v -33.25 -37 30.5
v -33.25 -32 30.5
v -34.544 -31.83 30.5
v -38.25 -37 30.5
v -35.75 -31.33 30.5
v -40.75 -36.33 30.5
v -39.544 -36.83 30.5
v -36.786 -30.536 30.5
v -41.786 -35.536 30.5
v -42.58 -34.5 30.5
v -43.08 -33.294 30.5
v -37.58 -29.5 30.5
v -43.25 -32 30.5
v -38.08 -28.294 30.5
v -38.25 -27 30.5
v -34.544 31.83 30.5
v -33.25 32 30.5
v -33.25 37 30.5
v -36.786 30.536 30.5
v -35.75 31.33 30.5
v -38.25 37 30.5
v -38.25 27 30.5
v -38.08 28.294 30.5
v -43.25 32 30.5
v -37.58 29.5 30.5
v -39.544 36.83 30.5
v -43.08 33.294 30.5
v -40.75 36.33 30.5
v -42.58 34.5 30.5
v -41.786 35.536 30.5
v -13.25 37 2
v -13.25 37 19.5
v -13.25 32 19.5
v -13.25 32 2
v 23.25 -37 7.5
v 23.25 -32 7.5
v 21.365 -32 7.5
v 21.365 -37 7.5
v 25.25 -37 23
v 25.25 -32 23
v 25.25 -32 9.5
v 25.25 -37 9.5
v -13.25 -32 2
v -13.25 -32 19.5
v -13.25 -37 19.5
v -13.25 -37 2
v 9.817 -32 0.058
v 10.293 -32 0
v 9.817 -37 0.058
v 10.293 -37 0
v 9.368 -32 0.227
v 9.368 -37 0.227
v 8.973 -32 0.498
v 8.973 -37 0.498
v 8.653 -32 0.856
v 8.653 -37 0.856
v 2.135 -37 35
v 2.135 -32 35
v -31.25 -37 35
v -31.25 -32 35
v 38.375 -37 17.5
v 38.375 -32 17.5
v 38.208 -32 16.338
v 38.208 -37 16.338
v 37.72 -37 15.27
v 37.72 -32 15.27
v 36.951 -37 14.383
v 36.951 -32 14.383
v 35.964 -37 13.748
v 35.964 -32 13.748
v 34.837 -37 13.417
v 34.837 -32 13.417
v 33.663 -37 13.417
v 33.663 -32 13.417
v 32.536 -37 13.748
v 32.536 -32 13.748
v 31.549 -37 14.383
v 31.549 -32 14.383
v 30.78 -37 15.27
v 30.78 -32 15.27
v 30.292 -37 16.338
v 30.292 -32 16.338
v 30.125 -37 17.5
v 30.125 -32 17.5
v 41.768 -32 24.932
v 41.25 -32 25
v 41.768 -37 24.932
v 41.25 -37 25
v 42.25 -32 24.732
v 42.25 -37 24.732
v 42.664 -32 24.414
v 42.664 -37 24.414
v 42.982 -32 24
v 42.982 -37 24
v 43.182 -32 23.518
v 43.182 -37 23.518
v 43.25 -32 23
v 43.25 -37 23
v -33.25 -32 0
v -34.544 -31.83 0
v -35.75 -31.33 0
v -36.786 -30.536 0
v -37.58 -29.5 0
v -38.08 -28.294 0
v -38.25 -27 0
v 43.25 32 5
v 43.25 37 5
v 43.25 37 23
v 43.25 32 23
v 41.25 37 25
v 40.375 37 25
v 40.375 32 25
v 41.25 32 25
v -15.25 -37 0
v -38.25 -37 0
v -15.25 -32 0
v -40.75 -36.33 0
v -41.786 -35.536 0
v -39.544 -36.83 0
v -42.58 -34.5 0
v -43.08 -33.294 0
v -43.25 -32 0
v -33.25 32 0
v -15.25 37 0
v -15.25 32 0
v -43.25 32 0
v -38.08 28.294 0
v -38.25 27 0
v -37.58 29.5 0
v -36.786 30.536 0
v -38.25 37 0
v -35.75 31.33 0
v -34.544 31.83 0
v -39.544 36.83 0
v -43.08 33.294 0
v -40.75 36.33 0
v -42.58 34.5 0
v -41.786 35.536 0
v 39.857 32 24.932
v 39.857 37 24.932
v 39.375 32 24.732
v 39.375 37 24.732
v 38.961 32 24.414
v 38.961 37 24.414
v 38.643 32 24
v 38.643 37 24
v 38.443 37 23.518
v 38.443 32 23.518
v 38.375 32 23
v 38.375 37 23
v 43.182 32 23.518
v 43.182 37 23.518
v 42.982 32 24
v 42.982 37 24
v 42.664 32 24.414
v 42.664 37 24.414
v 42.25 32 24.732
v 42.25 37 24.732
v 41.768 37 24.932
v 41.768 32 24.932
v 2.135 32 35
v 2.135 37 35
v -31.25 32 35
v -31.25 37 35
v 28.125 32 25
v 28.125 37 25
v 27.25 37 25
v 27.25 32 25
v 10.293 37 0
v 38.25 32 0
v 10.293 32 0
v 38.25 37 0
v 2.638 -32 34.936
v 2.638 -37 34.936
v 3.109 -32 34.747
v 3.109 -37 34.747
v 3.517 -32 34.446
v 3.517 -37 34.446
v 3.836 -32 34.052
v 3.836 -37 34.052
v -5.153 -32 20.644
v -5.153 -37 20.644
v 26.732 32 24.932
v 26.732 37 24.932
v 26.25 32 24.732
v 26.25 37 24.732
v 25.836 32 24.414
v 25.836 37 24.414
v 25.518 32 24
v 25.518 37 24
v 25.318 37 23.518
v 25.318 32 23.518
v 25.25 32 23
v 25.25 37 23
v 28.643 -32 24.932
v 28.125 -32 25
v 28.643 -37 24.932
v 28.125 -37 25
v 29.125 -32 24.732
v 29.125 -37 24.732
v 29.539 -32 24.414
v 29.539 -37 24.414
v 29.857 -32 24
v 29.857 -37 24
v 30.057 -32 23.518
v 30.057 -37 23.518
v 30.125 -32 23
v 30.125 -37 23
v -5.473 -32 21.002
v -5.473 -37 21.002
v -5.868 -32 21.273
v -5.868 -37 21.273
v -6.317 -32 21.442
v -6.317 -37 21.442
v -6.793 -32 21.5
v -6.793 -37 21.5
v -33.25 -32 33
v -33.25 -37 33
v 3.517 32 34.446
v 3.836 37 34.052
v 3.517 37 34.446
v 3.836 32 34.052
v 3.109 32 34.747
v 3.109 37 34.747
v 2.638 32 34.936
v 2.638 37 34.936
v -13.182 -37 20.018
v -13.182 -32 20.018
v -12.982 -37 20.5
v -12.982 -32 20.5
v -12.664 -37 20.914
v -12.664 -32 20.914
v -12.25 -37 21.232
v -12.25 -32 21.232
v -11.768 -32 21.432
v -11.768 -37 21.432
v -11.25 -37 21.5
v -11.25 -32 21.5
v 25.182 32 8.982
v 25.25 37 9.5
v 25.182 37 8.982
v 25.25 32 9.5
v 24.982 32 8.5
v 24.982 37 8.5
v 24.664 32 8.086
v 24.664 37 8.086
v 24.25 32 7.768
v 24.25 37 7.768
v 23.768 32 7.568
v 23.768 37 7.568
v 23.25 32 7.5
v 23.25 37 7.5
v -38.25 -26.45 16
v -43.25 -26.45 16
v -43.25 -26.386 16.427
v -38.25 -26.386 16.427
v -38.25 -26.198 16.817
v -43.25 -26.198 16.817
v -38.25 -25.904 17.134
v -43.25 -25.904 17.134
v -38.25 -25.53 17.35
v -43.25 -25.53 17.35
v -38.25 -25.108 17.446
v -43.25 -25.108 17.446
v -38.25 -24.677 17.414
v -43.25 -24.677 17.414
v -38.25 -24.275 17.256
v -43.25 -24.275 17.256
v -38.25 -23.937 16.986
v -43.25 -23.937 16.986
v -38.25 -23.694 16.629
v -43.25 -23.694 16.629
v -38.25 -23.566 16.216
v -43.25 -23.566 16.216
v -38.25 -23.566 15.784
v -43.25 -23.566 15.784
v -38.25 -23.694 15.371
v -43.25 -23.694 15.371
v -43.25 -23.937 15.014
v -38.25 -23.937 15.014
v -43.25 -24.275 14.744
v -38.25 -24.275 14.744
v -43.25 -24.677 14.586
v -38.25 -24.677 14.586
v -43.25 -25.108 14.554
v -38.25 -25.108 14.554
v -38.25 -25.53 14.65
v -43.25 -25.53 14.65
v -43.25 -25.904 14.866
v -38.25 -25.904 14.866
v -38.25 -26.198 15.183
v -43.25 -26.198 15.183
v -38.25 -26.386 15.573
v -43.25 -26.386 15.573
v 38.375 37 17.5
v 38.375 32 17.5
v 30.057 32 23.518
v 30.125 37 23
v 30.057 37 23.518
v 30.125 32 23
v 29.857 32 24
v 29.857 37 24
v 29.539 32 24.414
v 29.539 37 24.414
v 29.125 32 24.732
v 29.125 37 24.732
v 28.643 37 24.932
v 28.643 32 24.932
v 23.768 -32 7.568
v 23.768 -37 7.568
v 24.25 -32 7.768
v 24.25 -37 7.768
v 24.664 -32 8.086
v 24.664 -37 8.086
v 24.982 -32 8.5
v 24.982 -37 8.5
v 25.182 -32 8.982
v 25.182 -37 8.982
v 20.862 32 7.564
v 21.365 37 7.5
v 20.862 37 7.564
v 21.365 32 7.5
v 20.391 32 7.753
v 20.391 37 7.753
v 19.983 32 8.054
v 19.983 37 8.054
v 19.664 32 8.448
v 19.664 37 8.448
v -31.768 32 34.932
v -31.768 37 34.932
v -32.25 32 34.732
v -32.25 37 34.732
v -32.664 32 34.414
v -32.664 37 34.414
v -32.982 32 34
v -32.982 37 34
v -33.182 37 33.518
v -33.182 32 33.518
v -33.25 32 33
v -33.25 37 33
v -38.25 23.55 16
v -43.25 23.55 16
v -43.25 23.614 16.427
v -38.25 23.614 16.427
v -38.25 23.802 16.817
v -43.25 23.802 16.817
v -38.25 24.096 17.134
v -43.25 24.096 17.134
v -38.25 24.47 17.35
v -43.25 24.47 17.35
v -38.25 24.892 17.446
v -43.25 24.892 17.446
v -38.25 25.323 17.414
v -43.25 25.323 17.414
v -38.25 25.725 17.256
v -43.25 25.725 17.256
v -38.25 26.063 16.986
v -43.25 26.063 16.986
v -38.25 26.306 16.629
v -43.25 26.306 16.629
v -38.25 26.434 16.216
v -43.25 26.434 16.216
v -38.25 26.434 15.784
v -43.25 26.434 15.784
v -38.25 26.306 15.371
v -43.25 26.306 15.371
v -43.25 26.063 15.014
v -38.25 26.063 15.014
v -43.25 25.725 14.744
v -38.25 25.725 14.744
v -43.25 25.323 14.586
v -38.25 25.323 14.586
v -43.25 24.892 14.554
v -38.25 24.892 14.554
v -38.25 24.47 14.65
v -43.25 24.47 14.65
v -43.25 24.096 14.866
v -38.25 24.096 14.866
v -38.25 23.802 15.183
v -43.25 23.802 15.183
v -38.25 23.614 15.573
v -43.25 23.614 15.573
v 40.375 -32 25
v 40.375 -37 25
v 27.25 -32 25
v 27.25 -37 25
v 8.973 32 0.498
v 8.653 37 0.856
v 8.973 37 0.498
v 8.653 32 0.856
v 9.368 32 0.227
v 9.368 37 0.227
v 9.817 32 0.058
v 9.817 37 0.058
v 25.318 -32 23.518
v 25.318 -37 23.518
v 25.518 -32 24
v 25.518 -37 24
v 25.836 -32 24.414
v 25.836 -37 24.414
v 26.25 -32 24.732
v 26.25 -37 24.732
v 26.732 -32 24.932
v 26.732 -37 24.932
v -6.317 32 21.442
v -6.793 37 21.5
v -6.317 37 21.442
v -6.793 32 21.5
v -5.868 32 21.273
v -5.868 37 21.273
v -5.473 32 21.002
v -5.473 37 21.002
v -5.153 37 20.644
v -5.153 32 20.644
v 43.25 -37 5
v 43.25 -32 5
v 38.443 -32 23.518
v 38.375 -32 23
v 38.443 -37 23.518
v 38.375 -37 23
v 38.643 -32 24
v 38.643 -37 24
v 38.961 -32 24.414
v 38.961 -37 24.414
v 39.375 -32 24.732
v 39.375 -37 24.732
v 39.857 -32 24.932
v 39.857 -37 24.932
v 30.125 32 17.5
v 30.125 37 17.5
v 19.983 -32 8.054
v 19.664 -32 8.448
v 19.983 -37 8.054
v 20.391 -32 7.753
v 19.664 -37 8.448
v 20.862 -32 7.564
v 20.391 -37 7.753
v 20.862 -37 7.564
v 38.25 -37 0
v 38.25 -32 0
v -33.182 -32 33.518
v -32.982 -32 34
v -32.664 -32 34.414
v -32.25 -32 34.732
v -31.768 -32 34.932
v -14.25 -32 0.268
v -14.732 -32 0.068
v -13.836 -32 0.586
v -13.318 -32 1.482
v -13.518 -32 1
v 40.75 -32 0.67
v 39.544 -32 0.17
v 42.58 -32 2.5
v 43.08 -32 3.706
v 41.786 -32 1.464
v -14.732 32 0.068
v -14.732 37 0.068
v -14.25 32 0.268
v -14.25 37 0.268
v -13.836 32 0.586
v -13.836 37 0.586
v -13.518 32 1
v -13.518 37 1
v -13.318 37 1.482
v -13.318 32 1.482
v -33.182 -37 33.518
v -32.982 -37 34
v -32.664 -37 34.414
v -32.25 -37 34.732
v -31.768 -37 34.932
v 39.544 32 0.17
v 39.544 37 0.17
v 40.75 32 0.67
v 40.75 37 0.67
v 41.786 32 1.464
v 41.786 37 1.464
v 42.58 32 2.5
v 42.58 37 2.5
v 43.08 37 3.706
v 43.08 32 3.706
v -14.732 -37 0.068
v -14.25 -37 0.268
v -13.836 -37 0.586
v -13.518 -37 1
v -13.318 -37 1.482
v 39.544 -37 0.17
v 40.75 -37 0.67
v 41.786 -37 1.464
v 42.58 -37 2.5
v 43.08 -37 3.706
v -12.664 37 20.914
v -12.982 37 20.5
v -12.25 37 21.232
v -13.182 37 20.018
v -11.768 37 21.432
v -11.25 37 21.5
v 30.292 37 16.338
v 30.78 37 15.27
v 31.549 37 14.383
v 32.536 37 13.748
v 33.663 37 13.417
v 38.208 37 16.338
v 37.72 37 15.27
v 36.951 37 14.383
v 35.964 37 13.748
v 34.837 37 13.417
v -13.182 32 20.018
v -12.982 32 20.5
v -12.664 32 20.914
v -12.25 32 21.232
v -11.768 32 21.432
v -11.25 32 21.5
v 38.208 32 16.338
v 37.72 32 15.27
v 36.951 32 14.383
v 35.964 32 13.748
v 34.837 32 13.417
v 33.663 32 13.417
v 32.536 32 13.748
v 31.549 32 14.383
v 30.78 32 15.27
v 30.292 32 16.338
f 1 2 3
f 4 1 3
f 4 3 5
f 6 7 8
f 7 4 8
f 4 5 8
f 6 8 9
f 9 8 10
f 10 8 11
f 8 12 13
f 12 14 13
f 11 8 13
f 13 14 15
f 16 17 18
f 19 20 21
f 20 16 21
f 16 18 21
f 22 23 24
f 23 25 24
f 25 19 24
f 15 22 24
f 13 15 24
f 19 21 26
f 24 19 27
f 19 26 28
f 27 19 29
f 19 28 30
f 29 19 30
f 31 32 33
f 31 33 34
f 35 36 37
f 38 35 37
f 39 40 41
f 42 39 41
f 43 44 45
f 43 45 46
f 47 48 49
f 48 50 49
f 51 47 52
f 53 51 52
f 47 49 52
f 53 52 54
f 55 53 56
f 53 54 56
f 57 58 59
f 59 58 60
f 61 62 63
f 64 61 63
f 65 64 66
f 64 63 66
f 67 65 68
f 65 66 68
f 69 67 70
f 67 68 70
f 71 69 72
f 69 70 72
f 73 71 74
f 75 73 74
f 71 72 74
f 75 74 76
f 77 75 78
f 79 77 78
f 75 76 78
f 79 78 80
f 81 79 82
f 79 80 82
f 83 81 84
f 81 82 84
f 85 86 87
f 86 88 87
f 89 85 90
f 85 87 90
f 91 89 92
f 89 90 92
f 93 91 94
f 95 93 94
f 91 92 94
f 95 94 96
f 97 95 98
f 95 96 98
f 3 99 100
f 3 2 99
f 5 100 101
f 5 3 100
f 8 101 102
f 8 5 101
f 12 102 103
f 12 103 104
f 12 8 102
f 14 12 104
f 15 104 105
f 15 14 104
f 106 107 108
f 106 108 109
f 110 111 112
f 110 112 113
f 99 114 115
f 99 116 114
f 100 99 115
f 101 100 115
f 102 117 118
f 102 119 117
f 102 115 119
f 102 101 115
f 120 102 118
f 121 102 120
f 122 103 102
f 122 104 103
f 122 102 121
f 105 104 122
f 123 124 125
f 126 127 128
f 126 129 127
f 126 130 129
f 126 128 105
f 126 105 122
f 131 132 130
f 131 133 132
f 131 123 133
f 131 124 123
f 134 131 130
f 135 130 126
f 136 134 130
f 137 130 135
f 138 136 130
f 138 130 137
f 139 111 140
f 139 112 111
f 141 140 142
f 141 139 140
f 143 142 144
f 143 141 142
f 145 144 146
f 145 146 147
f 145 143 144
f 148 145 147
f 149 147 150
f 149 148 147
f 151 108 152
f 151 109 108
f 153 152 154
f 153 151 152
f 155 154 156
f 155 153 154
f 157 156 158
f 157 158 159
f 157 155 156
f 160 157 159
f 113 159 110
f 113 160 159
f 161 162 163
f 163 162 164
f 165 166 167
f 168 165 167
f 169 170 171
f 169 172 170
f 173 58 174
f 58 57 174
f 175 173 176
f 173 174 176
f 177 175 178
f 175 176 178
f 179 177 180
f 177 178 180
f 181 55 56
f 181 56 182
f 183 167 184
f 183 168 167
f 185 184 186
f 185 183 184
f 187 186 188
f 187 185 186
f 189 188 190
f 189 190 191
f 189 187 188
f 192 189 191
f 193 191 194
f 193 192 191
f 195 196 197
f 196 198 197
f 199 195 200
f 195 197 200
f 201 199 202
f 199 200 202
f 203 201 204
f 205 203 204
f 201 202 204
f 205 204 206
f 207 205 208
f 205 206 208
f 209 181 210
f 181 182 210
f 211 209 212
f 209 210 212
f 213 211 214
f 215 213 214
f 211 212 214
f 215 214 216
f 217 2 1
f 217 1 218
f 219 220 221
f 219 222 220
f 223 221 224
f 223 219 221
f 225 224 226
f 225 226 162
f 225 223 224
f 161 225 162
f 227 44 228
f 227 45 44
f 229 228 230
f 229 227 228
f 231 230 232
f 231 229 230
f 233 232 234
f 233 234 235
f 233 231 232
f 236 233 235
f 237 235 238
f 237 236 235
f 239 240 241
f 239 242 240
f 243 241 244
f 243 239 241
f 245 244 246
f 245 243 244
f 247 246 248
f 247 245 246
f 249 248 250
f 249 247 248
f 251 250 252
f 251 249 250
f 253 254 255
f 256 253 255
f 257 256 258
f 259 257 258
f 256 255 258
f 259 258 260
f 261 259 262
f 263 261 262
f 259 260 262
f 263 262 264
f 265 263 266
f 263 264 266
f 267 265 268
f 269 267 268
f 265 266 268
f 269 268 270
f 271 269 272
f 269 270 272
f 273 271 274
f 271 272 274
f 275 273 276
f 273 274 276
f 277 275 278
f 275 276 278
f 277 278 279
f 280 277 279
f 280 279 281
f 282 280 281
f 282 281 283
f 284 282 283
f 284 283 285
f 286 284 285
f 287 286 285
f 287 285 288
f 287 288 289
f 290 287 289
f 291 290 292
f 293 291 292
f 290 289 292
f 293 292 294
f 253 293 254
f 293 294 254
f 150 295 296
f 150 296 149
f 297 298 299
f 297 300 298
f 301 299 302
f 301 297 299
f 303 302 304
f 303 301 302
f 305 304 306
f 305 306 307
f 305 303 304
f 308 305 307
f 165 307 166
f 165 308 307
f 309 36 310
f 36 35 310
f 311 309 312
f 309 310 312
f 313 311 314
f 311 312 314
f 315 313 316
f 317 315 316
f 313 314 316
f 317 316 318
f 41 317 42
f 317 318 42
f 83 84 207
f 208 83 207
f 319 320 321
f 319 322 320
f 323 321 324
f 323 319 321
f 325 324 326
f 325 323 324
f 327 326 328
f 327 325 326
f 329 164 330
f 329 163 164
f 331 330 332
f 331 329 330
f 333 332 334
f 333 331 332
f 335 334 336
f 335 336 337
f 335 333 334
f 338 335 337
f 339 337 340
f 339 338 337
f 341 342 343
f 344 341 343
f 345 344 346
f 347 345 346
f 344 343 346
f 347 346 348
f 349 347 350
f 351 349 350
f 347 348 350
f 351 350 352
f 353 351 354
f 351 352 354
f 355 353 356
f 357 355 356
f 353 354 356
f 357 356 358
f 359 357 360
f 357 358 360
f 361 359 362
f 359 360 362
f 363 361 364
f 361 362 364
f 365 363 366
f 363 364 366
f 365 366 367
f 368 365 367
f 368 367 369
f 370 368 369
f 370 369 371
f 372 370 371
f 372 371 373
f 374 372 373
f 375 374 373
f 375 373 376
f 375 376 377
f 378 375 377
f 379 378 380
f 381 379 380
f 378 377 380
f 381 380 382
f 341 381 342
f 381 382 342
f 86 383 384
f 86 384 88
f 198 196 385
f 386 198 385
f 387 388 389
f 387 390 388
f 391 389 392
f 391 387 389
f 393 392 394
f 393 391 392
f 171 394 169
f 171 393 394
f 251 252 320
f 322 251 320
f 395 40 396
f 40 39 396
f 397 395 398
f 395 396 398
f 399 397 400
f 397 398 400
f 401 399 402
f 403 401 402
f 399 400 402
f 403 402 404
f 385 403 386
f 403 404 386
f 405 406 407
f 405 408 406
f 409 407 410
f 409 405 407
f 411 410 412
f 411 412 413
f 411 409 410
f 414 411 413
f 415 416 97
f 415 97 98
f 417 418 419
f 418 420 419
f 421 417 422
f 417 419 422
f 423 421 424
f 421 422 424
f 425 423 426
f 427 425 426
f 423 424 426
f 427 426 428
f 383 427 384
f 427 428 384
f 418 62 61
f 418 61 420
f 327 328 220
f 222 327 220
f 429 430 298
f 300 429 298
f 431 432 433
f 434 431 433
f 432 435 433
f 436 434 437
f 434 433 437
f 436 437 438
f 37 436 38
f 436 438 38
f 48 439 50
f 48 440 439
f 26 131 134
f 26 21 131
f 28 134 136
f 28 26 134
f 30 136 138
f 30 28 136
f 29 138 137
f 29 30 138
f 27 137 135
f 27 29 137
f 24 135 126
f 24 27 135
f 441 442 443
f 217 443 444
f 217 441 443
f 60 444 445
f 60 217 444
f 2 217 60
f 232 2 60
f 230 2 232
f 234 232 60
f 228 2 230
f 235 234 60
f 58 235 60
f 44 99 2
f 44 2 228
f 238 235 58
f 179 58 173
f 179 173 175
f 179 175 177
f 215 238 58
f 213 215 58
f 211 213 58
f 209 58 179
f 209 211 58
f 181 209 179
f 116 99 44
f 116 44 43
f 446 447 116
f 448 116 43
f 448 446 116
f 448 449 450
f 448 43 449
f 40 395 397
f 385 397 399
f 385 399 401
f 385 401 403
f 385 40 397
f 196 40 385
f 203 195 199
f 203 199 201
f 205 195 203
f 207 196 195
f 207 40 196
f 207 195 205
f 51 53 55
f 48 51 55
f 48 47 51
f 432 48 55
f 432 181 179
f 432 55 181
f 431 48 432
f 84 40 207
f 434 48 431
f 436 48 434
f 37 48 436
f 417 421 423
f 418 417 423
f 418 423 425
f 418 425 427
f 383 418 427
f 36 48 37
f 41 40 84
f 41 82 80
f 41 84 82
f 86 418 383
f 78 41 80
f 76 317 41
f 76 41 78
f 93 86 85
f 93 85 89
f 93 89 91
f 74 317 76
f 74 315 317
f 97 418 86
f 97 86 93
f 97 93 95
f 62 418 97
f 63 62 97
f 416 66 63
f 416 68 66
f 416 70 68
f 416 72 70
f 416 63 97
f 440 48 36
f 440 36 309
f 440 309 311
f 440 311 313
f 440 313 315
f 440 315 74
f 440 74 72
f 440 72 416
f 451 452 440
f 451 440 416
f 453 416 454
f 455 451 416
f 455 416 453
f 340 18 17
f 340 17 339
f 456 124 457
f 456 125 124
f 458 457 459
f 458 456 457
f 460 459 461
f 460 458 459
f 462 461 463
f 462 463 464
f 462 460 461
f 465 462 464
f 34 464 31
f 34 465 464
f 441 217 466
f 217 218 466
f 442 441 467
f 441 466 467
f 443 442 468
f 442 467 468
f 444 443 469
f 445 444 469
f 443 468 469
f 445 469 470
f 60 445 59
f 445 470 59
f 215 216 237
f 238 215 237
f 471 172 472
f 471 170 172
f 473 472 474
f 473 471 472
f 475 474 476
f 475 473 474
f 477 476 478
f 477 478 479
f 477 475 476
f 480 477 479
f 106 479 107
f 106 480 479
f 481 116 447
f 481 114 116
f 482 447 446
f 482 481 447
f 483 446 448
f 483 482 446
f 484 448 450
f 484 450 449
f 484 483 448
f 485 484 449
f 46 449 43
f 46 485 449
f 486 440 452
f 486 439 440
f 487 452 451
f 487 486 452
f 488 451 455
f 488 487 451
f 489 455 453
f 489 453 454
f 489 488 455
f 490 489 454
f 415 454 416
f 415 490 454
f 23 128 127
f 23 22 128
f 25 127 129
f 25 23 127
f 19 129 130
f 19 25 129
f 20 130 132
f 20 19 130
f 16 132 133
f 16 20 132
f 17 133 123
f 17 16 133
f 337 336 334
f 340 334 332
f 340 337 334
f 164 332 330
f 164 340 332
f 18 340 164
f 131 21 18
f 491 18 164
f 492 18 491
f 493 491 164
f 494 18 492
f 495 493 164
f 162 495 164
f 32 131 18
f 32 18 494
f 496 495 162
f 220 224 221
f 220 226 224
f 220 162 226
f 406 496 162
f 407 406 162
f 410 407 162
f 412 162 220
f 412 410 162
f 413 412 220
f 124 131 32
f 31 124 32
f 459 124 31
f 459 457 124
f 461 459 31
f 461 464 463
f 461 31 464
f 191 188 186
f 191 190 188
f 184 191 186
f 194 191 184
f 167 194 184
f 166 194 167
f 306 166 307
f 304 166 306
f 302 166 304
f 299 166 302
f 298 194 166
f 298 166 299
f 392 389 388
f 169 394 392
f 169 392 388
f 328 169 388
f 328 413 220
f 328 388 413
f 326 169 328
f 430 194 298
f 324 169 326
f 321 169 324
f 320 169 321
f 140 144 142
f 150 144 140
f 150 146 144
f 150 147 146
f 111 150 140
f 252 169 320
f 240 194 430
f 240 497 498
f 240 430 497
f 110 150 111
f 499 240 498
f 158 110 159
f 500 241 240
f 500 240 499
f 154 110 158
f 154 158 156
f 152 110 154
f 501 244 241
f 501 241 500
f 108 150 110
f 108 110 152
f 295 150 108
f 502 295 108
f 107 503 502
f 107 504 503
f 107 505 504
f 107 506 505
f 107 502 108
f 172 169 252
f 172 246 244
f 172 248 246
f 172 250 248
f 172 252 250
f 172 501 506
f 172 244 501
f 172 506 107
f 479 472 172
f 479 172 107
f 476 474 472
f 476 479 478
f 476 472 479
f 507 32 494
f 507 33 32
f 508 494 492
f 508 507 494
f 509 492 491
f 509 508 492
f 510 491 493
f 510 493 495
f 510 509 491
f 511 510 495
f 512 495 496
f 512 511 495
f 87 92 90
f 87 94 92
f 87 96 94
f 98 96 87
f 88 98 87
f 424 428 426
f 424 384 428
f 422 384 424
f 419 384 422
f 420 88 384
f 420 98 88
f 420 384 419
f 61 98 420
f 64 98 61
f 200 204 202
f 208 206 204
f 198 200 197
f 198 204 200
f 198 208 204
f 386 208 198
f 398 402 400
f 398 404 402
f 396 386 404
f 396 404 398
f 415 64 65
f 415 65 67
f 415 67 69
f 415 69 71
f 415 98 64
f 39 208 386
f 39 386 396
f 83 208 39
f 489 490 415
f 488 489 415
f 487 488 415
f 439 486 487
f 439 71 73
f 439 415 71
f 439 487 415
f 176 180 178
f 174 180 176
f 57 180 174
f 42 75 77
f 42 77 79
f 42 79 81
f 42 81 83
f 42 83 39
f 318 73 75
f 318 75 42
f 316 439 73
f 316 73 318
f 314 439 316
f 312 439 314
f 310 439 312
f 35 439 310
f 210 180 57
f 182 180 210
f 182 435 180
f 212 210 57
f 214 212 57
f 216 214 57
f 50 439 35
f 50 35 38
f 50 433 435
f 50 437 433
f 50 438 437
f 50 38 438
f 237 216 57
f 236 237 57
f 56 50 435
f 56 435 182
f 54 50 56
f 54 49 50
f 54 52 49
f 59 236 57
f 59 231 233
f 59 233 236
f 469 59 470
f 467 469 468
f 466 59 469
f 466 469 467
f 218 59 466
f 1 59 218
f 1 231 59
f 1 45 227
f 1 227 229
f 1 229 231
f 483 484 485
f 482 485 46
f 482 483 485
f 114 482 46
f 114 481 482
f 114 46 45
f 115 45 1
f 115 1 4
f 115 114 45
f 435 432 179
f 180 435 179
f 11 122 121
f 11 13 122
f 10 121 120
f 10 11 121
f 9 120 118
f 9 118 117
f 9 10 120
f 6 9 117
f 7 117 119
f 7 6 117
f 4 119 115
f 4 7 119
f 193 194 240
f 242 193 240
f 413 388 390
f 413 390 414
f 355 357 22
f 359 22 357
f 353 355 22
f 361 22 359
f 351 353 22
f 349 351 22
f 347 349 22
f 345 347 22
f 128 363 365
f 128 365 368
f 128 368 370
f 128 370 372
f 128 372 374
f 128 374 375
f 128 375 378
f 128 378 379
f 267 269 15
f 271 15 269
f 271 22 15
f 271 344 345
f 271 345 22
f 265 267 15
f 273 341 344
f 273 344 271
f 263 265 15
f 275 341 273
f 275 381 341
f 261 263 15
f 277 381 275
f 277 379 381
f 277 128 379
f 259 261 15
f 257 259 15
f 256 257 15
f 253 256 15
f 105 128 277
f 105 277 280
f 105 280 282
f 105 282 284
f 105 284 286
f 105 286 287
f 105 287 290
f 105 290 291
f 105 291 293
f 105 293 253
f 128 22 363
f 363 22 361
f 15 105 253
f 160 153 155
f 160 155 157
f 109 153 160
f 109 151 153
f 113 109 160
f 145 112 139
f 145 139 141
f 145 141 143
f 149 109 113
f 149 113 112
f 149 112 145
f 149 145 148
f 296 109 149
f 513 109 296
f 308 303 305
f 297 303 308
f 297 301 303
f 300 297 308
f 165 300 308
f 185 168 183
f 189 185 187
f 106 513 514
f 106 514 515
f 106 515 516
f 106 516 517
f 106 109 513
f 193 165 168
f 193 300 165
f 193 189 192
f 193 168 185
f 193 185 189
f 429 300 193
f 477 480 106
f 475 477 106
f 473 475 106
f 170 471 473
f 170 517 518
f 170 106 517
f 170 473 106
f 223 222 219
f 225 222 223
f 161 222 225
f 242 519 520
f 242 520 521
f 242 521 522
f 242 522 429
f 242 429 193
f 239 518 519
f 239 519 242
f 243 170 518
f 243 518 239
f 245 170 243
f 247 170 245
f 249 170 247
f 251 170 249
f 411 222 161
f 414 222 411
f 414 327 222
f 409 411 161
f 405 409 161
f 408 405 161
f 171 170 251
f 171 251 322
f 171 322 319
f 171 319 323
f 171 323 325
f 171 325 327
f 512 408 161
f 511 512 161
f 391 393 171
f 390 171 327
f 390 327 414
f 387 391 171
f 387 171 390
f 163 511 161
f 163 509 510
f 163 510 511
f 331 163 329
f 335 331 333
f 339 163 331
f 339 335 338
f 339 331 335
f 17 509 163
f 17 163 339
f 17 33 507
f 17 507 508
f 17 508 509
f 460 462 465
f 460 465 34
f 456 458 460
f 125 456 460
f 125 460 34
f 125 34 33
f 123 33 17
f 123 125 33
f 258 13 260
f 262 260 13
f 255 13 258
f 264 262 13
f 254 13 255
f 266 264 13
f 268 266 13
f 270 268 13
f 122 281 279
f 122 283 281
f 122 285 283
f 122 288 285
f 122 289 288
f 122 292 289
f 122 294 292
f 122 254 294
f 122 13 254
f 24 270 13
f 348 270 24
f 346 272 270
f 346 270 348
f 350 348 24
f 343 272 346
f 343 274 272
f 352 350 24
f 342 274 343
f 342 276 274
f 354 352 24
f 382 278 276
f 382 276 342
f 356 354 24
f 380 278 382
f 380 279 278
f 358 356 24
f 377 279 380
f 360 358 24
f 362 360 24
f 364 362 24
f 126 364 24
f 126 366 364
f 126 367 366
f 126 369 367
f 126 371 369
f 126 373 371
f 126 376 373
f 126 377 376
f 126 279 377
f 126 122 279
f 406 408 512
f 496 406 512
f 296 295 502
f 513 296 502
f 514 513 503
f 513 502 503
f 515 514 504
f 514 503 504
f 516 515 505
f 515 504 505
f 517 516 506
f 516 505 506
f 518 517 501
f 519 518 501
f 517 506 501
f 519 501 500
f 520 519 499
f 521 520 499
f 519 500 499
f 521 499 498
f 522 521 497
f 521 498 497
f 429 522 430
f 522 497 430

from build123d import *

# Parameters (mm, degrees)
PAD_DEPTH       = 35
SKETCH001_W     = 10
SKETCH001_H     = 4.5
POCKET_DEPTH    = 74.001
FILLET_R        = 2
FILLET001_R     = 5
SKETCH002_R     = 1.45
POCKET001_DEPTH = 5


with BuildPart() as part:
    # Sketch → Pad (new body)
    with BuildSketch(Plane.XY):
        Polygon((-43.25, 37), (43.25, 37), (43.25, 32), (-38.25, 32), (-38.25, -32), (43.25, -32), (43.25, -37), (-43.25, -37), align=None)
    extrude(amount=PAD_DEPTH)

    # Sketch001 → Pocket (cut, through all)
    with BuildSketch(Plane(origin=(0, 37, 0), x_dir=(-1, 0, 0), z_dir=(0, 1, 0))):
        with BuildLine():
            ThreePointArc((-38.375, 17.5), (-34.25, 13.375), (-30.125, 17.5))
            Line((-30.125, 17.5), (-30.125, 25))
            Line((-30.125, 25), (-25.25, 25))
            Line((-25.25, 25), (-25.25, 7.5))
            Line((-25.25, 7.5), (-20.25, 7.5))
            Line((-20.25, 7.5), (-3.25, 35))
            Line((-43.25, 35), (-3.25, 35))
            Line((-43.25, 25), (-43.25, 35))
            Line((-38.375, 25), (-43.25, 25))
            Line((-38.375, 17.5), (-38.375, 25))
        make_face()
        with Locations((38.25, 32.75)):
            Rectangle(SKETCH001_W, SKETCH001_H)
        Polygon((5.75, 21.5), (13.25, 21.5), (13.25, 0), (-9.25, 0), align=None)
    extrude(amount=-POCKET_DEPTH, mode=Mode.SUBTRACT)

    # Fillet
    fillet_edges = [part.edges().sort_by_distance(p)[0] for p in [
        (43.25, 34.5, 25),
        (38.375, 34.5, 25),
        (30.125, 34.5, 25),
        (25.25, 34.5, 25),
        (43.25, -34.5, 25),
        (38.375, -34.5, 25),
        (30.125, -34.5, 25),
        (25.25, -34.5, 25),
        (3.25, -34.5, 35),
        (-33.25, -34.5, 35),
        (-33.25, 34.5, 35),
        (3.25, 34.5, 35),
        (20.25, -34.5, 7.5),
        (20.25, 34.5, 7.5),
        (25.25, -34.5, 7.5),
        (25.25, 34.5, 7.5),
        (9.25, 34.5, 0),
        (9.25, -34.5, 0),
        (-5.75, -34.5, 21.5),
        (-5.75, 34.5, 21.5),
        (-13.25, 34.5, 0),
        (-13.25, -34.5, 0),
        (-13.25, 34.5, 21.5),
        (-13.25, -34.5, 21.5),
    ]]
    fillet(fillet_edges, radius=FILLET_R)

    # Fillet001
    fillet001_edges = [part.edges().sort_by_distance(p)[0] for p in [
        (43.25, 34.5, 0),
        (43.25, -34.5, 0),
        (-38.25, -32, 15.25),
        (-43.25, 37, 15.25),
        (-38.25, 32, 15.25),
        (-43.25, -37, 15.25),
    ]]
    fillet(fillet001_edges, radius=FILLET001_R)

    # Sketch002 → Pocket001 (cut)
    with BuildSketch(Plane(origin=(-43.25, 0, 0), x_dir=(0, -1, 0), z_dir=(-1, 0, 0))):
        with Locations((-25, 16)):
            Circle(SKETCH002_R)
        with Locations((25, 16)):
            Circle(SKETCH002_R)
    extrude(amount=-POCKET001_DEPTH, mode=Mode.SUBTRACT)


solid = part.part
